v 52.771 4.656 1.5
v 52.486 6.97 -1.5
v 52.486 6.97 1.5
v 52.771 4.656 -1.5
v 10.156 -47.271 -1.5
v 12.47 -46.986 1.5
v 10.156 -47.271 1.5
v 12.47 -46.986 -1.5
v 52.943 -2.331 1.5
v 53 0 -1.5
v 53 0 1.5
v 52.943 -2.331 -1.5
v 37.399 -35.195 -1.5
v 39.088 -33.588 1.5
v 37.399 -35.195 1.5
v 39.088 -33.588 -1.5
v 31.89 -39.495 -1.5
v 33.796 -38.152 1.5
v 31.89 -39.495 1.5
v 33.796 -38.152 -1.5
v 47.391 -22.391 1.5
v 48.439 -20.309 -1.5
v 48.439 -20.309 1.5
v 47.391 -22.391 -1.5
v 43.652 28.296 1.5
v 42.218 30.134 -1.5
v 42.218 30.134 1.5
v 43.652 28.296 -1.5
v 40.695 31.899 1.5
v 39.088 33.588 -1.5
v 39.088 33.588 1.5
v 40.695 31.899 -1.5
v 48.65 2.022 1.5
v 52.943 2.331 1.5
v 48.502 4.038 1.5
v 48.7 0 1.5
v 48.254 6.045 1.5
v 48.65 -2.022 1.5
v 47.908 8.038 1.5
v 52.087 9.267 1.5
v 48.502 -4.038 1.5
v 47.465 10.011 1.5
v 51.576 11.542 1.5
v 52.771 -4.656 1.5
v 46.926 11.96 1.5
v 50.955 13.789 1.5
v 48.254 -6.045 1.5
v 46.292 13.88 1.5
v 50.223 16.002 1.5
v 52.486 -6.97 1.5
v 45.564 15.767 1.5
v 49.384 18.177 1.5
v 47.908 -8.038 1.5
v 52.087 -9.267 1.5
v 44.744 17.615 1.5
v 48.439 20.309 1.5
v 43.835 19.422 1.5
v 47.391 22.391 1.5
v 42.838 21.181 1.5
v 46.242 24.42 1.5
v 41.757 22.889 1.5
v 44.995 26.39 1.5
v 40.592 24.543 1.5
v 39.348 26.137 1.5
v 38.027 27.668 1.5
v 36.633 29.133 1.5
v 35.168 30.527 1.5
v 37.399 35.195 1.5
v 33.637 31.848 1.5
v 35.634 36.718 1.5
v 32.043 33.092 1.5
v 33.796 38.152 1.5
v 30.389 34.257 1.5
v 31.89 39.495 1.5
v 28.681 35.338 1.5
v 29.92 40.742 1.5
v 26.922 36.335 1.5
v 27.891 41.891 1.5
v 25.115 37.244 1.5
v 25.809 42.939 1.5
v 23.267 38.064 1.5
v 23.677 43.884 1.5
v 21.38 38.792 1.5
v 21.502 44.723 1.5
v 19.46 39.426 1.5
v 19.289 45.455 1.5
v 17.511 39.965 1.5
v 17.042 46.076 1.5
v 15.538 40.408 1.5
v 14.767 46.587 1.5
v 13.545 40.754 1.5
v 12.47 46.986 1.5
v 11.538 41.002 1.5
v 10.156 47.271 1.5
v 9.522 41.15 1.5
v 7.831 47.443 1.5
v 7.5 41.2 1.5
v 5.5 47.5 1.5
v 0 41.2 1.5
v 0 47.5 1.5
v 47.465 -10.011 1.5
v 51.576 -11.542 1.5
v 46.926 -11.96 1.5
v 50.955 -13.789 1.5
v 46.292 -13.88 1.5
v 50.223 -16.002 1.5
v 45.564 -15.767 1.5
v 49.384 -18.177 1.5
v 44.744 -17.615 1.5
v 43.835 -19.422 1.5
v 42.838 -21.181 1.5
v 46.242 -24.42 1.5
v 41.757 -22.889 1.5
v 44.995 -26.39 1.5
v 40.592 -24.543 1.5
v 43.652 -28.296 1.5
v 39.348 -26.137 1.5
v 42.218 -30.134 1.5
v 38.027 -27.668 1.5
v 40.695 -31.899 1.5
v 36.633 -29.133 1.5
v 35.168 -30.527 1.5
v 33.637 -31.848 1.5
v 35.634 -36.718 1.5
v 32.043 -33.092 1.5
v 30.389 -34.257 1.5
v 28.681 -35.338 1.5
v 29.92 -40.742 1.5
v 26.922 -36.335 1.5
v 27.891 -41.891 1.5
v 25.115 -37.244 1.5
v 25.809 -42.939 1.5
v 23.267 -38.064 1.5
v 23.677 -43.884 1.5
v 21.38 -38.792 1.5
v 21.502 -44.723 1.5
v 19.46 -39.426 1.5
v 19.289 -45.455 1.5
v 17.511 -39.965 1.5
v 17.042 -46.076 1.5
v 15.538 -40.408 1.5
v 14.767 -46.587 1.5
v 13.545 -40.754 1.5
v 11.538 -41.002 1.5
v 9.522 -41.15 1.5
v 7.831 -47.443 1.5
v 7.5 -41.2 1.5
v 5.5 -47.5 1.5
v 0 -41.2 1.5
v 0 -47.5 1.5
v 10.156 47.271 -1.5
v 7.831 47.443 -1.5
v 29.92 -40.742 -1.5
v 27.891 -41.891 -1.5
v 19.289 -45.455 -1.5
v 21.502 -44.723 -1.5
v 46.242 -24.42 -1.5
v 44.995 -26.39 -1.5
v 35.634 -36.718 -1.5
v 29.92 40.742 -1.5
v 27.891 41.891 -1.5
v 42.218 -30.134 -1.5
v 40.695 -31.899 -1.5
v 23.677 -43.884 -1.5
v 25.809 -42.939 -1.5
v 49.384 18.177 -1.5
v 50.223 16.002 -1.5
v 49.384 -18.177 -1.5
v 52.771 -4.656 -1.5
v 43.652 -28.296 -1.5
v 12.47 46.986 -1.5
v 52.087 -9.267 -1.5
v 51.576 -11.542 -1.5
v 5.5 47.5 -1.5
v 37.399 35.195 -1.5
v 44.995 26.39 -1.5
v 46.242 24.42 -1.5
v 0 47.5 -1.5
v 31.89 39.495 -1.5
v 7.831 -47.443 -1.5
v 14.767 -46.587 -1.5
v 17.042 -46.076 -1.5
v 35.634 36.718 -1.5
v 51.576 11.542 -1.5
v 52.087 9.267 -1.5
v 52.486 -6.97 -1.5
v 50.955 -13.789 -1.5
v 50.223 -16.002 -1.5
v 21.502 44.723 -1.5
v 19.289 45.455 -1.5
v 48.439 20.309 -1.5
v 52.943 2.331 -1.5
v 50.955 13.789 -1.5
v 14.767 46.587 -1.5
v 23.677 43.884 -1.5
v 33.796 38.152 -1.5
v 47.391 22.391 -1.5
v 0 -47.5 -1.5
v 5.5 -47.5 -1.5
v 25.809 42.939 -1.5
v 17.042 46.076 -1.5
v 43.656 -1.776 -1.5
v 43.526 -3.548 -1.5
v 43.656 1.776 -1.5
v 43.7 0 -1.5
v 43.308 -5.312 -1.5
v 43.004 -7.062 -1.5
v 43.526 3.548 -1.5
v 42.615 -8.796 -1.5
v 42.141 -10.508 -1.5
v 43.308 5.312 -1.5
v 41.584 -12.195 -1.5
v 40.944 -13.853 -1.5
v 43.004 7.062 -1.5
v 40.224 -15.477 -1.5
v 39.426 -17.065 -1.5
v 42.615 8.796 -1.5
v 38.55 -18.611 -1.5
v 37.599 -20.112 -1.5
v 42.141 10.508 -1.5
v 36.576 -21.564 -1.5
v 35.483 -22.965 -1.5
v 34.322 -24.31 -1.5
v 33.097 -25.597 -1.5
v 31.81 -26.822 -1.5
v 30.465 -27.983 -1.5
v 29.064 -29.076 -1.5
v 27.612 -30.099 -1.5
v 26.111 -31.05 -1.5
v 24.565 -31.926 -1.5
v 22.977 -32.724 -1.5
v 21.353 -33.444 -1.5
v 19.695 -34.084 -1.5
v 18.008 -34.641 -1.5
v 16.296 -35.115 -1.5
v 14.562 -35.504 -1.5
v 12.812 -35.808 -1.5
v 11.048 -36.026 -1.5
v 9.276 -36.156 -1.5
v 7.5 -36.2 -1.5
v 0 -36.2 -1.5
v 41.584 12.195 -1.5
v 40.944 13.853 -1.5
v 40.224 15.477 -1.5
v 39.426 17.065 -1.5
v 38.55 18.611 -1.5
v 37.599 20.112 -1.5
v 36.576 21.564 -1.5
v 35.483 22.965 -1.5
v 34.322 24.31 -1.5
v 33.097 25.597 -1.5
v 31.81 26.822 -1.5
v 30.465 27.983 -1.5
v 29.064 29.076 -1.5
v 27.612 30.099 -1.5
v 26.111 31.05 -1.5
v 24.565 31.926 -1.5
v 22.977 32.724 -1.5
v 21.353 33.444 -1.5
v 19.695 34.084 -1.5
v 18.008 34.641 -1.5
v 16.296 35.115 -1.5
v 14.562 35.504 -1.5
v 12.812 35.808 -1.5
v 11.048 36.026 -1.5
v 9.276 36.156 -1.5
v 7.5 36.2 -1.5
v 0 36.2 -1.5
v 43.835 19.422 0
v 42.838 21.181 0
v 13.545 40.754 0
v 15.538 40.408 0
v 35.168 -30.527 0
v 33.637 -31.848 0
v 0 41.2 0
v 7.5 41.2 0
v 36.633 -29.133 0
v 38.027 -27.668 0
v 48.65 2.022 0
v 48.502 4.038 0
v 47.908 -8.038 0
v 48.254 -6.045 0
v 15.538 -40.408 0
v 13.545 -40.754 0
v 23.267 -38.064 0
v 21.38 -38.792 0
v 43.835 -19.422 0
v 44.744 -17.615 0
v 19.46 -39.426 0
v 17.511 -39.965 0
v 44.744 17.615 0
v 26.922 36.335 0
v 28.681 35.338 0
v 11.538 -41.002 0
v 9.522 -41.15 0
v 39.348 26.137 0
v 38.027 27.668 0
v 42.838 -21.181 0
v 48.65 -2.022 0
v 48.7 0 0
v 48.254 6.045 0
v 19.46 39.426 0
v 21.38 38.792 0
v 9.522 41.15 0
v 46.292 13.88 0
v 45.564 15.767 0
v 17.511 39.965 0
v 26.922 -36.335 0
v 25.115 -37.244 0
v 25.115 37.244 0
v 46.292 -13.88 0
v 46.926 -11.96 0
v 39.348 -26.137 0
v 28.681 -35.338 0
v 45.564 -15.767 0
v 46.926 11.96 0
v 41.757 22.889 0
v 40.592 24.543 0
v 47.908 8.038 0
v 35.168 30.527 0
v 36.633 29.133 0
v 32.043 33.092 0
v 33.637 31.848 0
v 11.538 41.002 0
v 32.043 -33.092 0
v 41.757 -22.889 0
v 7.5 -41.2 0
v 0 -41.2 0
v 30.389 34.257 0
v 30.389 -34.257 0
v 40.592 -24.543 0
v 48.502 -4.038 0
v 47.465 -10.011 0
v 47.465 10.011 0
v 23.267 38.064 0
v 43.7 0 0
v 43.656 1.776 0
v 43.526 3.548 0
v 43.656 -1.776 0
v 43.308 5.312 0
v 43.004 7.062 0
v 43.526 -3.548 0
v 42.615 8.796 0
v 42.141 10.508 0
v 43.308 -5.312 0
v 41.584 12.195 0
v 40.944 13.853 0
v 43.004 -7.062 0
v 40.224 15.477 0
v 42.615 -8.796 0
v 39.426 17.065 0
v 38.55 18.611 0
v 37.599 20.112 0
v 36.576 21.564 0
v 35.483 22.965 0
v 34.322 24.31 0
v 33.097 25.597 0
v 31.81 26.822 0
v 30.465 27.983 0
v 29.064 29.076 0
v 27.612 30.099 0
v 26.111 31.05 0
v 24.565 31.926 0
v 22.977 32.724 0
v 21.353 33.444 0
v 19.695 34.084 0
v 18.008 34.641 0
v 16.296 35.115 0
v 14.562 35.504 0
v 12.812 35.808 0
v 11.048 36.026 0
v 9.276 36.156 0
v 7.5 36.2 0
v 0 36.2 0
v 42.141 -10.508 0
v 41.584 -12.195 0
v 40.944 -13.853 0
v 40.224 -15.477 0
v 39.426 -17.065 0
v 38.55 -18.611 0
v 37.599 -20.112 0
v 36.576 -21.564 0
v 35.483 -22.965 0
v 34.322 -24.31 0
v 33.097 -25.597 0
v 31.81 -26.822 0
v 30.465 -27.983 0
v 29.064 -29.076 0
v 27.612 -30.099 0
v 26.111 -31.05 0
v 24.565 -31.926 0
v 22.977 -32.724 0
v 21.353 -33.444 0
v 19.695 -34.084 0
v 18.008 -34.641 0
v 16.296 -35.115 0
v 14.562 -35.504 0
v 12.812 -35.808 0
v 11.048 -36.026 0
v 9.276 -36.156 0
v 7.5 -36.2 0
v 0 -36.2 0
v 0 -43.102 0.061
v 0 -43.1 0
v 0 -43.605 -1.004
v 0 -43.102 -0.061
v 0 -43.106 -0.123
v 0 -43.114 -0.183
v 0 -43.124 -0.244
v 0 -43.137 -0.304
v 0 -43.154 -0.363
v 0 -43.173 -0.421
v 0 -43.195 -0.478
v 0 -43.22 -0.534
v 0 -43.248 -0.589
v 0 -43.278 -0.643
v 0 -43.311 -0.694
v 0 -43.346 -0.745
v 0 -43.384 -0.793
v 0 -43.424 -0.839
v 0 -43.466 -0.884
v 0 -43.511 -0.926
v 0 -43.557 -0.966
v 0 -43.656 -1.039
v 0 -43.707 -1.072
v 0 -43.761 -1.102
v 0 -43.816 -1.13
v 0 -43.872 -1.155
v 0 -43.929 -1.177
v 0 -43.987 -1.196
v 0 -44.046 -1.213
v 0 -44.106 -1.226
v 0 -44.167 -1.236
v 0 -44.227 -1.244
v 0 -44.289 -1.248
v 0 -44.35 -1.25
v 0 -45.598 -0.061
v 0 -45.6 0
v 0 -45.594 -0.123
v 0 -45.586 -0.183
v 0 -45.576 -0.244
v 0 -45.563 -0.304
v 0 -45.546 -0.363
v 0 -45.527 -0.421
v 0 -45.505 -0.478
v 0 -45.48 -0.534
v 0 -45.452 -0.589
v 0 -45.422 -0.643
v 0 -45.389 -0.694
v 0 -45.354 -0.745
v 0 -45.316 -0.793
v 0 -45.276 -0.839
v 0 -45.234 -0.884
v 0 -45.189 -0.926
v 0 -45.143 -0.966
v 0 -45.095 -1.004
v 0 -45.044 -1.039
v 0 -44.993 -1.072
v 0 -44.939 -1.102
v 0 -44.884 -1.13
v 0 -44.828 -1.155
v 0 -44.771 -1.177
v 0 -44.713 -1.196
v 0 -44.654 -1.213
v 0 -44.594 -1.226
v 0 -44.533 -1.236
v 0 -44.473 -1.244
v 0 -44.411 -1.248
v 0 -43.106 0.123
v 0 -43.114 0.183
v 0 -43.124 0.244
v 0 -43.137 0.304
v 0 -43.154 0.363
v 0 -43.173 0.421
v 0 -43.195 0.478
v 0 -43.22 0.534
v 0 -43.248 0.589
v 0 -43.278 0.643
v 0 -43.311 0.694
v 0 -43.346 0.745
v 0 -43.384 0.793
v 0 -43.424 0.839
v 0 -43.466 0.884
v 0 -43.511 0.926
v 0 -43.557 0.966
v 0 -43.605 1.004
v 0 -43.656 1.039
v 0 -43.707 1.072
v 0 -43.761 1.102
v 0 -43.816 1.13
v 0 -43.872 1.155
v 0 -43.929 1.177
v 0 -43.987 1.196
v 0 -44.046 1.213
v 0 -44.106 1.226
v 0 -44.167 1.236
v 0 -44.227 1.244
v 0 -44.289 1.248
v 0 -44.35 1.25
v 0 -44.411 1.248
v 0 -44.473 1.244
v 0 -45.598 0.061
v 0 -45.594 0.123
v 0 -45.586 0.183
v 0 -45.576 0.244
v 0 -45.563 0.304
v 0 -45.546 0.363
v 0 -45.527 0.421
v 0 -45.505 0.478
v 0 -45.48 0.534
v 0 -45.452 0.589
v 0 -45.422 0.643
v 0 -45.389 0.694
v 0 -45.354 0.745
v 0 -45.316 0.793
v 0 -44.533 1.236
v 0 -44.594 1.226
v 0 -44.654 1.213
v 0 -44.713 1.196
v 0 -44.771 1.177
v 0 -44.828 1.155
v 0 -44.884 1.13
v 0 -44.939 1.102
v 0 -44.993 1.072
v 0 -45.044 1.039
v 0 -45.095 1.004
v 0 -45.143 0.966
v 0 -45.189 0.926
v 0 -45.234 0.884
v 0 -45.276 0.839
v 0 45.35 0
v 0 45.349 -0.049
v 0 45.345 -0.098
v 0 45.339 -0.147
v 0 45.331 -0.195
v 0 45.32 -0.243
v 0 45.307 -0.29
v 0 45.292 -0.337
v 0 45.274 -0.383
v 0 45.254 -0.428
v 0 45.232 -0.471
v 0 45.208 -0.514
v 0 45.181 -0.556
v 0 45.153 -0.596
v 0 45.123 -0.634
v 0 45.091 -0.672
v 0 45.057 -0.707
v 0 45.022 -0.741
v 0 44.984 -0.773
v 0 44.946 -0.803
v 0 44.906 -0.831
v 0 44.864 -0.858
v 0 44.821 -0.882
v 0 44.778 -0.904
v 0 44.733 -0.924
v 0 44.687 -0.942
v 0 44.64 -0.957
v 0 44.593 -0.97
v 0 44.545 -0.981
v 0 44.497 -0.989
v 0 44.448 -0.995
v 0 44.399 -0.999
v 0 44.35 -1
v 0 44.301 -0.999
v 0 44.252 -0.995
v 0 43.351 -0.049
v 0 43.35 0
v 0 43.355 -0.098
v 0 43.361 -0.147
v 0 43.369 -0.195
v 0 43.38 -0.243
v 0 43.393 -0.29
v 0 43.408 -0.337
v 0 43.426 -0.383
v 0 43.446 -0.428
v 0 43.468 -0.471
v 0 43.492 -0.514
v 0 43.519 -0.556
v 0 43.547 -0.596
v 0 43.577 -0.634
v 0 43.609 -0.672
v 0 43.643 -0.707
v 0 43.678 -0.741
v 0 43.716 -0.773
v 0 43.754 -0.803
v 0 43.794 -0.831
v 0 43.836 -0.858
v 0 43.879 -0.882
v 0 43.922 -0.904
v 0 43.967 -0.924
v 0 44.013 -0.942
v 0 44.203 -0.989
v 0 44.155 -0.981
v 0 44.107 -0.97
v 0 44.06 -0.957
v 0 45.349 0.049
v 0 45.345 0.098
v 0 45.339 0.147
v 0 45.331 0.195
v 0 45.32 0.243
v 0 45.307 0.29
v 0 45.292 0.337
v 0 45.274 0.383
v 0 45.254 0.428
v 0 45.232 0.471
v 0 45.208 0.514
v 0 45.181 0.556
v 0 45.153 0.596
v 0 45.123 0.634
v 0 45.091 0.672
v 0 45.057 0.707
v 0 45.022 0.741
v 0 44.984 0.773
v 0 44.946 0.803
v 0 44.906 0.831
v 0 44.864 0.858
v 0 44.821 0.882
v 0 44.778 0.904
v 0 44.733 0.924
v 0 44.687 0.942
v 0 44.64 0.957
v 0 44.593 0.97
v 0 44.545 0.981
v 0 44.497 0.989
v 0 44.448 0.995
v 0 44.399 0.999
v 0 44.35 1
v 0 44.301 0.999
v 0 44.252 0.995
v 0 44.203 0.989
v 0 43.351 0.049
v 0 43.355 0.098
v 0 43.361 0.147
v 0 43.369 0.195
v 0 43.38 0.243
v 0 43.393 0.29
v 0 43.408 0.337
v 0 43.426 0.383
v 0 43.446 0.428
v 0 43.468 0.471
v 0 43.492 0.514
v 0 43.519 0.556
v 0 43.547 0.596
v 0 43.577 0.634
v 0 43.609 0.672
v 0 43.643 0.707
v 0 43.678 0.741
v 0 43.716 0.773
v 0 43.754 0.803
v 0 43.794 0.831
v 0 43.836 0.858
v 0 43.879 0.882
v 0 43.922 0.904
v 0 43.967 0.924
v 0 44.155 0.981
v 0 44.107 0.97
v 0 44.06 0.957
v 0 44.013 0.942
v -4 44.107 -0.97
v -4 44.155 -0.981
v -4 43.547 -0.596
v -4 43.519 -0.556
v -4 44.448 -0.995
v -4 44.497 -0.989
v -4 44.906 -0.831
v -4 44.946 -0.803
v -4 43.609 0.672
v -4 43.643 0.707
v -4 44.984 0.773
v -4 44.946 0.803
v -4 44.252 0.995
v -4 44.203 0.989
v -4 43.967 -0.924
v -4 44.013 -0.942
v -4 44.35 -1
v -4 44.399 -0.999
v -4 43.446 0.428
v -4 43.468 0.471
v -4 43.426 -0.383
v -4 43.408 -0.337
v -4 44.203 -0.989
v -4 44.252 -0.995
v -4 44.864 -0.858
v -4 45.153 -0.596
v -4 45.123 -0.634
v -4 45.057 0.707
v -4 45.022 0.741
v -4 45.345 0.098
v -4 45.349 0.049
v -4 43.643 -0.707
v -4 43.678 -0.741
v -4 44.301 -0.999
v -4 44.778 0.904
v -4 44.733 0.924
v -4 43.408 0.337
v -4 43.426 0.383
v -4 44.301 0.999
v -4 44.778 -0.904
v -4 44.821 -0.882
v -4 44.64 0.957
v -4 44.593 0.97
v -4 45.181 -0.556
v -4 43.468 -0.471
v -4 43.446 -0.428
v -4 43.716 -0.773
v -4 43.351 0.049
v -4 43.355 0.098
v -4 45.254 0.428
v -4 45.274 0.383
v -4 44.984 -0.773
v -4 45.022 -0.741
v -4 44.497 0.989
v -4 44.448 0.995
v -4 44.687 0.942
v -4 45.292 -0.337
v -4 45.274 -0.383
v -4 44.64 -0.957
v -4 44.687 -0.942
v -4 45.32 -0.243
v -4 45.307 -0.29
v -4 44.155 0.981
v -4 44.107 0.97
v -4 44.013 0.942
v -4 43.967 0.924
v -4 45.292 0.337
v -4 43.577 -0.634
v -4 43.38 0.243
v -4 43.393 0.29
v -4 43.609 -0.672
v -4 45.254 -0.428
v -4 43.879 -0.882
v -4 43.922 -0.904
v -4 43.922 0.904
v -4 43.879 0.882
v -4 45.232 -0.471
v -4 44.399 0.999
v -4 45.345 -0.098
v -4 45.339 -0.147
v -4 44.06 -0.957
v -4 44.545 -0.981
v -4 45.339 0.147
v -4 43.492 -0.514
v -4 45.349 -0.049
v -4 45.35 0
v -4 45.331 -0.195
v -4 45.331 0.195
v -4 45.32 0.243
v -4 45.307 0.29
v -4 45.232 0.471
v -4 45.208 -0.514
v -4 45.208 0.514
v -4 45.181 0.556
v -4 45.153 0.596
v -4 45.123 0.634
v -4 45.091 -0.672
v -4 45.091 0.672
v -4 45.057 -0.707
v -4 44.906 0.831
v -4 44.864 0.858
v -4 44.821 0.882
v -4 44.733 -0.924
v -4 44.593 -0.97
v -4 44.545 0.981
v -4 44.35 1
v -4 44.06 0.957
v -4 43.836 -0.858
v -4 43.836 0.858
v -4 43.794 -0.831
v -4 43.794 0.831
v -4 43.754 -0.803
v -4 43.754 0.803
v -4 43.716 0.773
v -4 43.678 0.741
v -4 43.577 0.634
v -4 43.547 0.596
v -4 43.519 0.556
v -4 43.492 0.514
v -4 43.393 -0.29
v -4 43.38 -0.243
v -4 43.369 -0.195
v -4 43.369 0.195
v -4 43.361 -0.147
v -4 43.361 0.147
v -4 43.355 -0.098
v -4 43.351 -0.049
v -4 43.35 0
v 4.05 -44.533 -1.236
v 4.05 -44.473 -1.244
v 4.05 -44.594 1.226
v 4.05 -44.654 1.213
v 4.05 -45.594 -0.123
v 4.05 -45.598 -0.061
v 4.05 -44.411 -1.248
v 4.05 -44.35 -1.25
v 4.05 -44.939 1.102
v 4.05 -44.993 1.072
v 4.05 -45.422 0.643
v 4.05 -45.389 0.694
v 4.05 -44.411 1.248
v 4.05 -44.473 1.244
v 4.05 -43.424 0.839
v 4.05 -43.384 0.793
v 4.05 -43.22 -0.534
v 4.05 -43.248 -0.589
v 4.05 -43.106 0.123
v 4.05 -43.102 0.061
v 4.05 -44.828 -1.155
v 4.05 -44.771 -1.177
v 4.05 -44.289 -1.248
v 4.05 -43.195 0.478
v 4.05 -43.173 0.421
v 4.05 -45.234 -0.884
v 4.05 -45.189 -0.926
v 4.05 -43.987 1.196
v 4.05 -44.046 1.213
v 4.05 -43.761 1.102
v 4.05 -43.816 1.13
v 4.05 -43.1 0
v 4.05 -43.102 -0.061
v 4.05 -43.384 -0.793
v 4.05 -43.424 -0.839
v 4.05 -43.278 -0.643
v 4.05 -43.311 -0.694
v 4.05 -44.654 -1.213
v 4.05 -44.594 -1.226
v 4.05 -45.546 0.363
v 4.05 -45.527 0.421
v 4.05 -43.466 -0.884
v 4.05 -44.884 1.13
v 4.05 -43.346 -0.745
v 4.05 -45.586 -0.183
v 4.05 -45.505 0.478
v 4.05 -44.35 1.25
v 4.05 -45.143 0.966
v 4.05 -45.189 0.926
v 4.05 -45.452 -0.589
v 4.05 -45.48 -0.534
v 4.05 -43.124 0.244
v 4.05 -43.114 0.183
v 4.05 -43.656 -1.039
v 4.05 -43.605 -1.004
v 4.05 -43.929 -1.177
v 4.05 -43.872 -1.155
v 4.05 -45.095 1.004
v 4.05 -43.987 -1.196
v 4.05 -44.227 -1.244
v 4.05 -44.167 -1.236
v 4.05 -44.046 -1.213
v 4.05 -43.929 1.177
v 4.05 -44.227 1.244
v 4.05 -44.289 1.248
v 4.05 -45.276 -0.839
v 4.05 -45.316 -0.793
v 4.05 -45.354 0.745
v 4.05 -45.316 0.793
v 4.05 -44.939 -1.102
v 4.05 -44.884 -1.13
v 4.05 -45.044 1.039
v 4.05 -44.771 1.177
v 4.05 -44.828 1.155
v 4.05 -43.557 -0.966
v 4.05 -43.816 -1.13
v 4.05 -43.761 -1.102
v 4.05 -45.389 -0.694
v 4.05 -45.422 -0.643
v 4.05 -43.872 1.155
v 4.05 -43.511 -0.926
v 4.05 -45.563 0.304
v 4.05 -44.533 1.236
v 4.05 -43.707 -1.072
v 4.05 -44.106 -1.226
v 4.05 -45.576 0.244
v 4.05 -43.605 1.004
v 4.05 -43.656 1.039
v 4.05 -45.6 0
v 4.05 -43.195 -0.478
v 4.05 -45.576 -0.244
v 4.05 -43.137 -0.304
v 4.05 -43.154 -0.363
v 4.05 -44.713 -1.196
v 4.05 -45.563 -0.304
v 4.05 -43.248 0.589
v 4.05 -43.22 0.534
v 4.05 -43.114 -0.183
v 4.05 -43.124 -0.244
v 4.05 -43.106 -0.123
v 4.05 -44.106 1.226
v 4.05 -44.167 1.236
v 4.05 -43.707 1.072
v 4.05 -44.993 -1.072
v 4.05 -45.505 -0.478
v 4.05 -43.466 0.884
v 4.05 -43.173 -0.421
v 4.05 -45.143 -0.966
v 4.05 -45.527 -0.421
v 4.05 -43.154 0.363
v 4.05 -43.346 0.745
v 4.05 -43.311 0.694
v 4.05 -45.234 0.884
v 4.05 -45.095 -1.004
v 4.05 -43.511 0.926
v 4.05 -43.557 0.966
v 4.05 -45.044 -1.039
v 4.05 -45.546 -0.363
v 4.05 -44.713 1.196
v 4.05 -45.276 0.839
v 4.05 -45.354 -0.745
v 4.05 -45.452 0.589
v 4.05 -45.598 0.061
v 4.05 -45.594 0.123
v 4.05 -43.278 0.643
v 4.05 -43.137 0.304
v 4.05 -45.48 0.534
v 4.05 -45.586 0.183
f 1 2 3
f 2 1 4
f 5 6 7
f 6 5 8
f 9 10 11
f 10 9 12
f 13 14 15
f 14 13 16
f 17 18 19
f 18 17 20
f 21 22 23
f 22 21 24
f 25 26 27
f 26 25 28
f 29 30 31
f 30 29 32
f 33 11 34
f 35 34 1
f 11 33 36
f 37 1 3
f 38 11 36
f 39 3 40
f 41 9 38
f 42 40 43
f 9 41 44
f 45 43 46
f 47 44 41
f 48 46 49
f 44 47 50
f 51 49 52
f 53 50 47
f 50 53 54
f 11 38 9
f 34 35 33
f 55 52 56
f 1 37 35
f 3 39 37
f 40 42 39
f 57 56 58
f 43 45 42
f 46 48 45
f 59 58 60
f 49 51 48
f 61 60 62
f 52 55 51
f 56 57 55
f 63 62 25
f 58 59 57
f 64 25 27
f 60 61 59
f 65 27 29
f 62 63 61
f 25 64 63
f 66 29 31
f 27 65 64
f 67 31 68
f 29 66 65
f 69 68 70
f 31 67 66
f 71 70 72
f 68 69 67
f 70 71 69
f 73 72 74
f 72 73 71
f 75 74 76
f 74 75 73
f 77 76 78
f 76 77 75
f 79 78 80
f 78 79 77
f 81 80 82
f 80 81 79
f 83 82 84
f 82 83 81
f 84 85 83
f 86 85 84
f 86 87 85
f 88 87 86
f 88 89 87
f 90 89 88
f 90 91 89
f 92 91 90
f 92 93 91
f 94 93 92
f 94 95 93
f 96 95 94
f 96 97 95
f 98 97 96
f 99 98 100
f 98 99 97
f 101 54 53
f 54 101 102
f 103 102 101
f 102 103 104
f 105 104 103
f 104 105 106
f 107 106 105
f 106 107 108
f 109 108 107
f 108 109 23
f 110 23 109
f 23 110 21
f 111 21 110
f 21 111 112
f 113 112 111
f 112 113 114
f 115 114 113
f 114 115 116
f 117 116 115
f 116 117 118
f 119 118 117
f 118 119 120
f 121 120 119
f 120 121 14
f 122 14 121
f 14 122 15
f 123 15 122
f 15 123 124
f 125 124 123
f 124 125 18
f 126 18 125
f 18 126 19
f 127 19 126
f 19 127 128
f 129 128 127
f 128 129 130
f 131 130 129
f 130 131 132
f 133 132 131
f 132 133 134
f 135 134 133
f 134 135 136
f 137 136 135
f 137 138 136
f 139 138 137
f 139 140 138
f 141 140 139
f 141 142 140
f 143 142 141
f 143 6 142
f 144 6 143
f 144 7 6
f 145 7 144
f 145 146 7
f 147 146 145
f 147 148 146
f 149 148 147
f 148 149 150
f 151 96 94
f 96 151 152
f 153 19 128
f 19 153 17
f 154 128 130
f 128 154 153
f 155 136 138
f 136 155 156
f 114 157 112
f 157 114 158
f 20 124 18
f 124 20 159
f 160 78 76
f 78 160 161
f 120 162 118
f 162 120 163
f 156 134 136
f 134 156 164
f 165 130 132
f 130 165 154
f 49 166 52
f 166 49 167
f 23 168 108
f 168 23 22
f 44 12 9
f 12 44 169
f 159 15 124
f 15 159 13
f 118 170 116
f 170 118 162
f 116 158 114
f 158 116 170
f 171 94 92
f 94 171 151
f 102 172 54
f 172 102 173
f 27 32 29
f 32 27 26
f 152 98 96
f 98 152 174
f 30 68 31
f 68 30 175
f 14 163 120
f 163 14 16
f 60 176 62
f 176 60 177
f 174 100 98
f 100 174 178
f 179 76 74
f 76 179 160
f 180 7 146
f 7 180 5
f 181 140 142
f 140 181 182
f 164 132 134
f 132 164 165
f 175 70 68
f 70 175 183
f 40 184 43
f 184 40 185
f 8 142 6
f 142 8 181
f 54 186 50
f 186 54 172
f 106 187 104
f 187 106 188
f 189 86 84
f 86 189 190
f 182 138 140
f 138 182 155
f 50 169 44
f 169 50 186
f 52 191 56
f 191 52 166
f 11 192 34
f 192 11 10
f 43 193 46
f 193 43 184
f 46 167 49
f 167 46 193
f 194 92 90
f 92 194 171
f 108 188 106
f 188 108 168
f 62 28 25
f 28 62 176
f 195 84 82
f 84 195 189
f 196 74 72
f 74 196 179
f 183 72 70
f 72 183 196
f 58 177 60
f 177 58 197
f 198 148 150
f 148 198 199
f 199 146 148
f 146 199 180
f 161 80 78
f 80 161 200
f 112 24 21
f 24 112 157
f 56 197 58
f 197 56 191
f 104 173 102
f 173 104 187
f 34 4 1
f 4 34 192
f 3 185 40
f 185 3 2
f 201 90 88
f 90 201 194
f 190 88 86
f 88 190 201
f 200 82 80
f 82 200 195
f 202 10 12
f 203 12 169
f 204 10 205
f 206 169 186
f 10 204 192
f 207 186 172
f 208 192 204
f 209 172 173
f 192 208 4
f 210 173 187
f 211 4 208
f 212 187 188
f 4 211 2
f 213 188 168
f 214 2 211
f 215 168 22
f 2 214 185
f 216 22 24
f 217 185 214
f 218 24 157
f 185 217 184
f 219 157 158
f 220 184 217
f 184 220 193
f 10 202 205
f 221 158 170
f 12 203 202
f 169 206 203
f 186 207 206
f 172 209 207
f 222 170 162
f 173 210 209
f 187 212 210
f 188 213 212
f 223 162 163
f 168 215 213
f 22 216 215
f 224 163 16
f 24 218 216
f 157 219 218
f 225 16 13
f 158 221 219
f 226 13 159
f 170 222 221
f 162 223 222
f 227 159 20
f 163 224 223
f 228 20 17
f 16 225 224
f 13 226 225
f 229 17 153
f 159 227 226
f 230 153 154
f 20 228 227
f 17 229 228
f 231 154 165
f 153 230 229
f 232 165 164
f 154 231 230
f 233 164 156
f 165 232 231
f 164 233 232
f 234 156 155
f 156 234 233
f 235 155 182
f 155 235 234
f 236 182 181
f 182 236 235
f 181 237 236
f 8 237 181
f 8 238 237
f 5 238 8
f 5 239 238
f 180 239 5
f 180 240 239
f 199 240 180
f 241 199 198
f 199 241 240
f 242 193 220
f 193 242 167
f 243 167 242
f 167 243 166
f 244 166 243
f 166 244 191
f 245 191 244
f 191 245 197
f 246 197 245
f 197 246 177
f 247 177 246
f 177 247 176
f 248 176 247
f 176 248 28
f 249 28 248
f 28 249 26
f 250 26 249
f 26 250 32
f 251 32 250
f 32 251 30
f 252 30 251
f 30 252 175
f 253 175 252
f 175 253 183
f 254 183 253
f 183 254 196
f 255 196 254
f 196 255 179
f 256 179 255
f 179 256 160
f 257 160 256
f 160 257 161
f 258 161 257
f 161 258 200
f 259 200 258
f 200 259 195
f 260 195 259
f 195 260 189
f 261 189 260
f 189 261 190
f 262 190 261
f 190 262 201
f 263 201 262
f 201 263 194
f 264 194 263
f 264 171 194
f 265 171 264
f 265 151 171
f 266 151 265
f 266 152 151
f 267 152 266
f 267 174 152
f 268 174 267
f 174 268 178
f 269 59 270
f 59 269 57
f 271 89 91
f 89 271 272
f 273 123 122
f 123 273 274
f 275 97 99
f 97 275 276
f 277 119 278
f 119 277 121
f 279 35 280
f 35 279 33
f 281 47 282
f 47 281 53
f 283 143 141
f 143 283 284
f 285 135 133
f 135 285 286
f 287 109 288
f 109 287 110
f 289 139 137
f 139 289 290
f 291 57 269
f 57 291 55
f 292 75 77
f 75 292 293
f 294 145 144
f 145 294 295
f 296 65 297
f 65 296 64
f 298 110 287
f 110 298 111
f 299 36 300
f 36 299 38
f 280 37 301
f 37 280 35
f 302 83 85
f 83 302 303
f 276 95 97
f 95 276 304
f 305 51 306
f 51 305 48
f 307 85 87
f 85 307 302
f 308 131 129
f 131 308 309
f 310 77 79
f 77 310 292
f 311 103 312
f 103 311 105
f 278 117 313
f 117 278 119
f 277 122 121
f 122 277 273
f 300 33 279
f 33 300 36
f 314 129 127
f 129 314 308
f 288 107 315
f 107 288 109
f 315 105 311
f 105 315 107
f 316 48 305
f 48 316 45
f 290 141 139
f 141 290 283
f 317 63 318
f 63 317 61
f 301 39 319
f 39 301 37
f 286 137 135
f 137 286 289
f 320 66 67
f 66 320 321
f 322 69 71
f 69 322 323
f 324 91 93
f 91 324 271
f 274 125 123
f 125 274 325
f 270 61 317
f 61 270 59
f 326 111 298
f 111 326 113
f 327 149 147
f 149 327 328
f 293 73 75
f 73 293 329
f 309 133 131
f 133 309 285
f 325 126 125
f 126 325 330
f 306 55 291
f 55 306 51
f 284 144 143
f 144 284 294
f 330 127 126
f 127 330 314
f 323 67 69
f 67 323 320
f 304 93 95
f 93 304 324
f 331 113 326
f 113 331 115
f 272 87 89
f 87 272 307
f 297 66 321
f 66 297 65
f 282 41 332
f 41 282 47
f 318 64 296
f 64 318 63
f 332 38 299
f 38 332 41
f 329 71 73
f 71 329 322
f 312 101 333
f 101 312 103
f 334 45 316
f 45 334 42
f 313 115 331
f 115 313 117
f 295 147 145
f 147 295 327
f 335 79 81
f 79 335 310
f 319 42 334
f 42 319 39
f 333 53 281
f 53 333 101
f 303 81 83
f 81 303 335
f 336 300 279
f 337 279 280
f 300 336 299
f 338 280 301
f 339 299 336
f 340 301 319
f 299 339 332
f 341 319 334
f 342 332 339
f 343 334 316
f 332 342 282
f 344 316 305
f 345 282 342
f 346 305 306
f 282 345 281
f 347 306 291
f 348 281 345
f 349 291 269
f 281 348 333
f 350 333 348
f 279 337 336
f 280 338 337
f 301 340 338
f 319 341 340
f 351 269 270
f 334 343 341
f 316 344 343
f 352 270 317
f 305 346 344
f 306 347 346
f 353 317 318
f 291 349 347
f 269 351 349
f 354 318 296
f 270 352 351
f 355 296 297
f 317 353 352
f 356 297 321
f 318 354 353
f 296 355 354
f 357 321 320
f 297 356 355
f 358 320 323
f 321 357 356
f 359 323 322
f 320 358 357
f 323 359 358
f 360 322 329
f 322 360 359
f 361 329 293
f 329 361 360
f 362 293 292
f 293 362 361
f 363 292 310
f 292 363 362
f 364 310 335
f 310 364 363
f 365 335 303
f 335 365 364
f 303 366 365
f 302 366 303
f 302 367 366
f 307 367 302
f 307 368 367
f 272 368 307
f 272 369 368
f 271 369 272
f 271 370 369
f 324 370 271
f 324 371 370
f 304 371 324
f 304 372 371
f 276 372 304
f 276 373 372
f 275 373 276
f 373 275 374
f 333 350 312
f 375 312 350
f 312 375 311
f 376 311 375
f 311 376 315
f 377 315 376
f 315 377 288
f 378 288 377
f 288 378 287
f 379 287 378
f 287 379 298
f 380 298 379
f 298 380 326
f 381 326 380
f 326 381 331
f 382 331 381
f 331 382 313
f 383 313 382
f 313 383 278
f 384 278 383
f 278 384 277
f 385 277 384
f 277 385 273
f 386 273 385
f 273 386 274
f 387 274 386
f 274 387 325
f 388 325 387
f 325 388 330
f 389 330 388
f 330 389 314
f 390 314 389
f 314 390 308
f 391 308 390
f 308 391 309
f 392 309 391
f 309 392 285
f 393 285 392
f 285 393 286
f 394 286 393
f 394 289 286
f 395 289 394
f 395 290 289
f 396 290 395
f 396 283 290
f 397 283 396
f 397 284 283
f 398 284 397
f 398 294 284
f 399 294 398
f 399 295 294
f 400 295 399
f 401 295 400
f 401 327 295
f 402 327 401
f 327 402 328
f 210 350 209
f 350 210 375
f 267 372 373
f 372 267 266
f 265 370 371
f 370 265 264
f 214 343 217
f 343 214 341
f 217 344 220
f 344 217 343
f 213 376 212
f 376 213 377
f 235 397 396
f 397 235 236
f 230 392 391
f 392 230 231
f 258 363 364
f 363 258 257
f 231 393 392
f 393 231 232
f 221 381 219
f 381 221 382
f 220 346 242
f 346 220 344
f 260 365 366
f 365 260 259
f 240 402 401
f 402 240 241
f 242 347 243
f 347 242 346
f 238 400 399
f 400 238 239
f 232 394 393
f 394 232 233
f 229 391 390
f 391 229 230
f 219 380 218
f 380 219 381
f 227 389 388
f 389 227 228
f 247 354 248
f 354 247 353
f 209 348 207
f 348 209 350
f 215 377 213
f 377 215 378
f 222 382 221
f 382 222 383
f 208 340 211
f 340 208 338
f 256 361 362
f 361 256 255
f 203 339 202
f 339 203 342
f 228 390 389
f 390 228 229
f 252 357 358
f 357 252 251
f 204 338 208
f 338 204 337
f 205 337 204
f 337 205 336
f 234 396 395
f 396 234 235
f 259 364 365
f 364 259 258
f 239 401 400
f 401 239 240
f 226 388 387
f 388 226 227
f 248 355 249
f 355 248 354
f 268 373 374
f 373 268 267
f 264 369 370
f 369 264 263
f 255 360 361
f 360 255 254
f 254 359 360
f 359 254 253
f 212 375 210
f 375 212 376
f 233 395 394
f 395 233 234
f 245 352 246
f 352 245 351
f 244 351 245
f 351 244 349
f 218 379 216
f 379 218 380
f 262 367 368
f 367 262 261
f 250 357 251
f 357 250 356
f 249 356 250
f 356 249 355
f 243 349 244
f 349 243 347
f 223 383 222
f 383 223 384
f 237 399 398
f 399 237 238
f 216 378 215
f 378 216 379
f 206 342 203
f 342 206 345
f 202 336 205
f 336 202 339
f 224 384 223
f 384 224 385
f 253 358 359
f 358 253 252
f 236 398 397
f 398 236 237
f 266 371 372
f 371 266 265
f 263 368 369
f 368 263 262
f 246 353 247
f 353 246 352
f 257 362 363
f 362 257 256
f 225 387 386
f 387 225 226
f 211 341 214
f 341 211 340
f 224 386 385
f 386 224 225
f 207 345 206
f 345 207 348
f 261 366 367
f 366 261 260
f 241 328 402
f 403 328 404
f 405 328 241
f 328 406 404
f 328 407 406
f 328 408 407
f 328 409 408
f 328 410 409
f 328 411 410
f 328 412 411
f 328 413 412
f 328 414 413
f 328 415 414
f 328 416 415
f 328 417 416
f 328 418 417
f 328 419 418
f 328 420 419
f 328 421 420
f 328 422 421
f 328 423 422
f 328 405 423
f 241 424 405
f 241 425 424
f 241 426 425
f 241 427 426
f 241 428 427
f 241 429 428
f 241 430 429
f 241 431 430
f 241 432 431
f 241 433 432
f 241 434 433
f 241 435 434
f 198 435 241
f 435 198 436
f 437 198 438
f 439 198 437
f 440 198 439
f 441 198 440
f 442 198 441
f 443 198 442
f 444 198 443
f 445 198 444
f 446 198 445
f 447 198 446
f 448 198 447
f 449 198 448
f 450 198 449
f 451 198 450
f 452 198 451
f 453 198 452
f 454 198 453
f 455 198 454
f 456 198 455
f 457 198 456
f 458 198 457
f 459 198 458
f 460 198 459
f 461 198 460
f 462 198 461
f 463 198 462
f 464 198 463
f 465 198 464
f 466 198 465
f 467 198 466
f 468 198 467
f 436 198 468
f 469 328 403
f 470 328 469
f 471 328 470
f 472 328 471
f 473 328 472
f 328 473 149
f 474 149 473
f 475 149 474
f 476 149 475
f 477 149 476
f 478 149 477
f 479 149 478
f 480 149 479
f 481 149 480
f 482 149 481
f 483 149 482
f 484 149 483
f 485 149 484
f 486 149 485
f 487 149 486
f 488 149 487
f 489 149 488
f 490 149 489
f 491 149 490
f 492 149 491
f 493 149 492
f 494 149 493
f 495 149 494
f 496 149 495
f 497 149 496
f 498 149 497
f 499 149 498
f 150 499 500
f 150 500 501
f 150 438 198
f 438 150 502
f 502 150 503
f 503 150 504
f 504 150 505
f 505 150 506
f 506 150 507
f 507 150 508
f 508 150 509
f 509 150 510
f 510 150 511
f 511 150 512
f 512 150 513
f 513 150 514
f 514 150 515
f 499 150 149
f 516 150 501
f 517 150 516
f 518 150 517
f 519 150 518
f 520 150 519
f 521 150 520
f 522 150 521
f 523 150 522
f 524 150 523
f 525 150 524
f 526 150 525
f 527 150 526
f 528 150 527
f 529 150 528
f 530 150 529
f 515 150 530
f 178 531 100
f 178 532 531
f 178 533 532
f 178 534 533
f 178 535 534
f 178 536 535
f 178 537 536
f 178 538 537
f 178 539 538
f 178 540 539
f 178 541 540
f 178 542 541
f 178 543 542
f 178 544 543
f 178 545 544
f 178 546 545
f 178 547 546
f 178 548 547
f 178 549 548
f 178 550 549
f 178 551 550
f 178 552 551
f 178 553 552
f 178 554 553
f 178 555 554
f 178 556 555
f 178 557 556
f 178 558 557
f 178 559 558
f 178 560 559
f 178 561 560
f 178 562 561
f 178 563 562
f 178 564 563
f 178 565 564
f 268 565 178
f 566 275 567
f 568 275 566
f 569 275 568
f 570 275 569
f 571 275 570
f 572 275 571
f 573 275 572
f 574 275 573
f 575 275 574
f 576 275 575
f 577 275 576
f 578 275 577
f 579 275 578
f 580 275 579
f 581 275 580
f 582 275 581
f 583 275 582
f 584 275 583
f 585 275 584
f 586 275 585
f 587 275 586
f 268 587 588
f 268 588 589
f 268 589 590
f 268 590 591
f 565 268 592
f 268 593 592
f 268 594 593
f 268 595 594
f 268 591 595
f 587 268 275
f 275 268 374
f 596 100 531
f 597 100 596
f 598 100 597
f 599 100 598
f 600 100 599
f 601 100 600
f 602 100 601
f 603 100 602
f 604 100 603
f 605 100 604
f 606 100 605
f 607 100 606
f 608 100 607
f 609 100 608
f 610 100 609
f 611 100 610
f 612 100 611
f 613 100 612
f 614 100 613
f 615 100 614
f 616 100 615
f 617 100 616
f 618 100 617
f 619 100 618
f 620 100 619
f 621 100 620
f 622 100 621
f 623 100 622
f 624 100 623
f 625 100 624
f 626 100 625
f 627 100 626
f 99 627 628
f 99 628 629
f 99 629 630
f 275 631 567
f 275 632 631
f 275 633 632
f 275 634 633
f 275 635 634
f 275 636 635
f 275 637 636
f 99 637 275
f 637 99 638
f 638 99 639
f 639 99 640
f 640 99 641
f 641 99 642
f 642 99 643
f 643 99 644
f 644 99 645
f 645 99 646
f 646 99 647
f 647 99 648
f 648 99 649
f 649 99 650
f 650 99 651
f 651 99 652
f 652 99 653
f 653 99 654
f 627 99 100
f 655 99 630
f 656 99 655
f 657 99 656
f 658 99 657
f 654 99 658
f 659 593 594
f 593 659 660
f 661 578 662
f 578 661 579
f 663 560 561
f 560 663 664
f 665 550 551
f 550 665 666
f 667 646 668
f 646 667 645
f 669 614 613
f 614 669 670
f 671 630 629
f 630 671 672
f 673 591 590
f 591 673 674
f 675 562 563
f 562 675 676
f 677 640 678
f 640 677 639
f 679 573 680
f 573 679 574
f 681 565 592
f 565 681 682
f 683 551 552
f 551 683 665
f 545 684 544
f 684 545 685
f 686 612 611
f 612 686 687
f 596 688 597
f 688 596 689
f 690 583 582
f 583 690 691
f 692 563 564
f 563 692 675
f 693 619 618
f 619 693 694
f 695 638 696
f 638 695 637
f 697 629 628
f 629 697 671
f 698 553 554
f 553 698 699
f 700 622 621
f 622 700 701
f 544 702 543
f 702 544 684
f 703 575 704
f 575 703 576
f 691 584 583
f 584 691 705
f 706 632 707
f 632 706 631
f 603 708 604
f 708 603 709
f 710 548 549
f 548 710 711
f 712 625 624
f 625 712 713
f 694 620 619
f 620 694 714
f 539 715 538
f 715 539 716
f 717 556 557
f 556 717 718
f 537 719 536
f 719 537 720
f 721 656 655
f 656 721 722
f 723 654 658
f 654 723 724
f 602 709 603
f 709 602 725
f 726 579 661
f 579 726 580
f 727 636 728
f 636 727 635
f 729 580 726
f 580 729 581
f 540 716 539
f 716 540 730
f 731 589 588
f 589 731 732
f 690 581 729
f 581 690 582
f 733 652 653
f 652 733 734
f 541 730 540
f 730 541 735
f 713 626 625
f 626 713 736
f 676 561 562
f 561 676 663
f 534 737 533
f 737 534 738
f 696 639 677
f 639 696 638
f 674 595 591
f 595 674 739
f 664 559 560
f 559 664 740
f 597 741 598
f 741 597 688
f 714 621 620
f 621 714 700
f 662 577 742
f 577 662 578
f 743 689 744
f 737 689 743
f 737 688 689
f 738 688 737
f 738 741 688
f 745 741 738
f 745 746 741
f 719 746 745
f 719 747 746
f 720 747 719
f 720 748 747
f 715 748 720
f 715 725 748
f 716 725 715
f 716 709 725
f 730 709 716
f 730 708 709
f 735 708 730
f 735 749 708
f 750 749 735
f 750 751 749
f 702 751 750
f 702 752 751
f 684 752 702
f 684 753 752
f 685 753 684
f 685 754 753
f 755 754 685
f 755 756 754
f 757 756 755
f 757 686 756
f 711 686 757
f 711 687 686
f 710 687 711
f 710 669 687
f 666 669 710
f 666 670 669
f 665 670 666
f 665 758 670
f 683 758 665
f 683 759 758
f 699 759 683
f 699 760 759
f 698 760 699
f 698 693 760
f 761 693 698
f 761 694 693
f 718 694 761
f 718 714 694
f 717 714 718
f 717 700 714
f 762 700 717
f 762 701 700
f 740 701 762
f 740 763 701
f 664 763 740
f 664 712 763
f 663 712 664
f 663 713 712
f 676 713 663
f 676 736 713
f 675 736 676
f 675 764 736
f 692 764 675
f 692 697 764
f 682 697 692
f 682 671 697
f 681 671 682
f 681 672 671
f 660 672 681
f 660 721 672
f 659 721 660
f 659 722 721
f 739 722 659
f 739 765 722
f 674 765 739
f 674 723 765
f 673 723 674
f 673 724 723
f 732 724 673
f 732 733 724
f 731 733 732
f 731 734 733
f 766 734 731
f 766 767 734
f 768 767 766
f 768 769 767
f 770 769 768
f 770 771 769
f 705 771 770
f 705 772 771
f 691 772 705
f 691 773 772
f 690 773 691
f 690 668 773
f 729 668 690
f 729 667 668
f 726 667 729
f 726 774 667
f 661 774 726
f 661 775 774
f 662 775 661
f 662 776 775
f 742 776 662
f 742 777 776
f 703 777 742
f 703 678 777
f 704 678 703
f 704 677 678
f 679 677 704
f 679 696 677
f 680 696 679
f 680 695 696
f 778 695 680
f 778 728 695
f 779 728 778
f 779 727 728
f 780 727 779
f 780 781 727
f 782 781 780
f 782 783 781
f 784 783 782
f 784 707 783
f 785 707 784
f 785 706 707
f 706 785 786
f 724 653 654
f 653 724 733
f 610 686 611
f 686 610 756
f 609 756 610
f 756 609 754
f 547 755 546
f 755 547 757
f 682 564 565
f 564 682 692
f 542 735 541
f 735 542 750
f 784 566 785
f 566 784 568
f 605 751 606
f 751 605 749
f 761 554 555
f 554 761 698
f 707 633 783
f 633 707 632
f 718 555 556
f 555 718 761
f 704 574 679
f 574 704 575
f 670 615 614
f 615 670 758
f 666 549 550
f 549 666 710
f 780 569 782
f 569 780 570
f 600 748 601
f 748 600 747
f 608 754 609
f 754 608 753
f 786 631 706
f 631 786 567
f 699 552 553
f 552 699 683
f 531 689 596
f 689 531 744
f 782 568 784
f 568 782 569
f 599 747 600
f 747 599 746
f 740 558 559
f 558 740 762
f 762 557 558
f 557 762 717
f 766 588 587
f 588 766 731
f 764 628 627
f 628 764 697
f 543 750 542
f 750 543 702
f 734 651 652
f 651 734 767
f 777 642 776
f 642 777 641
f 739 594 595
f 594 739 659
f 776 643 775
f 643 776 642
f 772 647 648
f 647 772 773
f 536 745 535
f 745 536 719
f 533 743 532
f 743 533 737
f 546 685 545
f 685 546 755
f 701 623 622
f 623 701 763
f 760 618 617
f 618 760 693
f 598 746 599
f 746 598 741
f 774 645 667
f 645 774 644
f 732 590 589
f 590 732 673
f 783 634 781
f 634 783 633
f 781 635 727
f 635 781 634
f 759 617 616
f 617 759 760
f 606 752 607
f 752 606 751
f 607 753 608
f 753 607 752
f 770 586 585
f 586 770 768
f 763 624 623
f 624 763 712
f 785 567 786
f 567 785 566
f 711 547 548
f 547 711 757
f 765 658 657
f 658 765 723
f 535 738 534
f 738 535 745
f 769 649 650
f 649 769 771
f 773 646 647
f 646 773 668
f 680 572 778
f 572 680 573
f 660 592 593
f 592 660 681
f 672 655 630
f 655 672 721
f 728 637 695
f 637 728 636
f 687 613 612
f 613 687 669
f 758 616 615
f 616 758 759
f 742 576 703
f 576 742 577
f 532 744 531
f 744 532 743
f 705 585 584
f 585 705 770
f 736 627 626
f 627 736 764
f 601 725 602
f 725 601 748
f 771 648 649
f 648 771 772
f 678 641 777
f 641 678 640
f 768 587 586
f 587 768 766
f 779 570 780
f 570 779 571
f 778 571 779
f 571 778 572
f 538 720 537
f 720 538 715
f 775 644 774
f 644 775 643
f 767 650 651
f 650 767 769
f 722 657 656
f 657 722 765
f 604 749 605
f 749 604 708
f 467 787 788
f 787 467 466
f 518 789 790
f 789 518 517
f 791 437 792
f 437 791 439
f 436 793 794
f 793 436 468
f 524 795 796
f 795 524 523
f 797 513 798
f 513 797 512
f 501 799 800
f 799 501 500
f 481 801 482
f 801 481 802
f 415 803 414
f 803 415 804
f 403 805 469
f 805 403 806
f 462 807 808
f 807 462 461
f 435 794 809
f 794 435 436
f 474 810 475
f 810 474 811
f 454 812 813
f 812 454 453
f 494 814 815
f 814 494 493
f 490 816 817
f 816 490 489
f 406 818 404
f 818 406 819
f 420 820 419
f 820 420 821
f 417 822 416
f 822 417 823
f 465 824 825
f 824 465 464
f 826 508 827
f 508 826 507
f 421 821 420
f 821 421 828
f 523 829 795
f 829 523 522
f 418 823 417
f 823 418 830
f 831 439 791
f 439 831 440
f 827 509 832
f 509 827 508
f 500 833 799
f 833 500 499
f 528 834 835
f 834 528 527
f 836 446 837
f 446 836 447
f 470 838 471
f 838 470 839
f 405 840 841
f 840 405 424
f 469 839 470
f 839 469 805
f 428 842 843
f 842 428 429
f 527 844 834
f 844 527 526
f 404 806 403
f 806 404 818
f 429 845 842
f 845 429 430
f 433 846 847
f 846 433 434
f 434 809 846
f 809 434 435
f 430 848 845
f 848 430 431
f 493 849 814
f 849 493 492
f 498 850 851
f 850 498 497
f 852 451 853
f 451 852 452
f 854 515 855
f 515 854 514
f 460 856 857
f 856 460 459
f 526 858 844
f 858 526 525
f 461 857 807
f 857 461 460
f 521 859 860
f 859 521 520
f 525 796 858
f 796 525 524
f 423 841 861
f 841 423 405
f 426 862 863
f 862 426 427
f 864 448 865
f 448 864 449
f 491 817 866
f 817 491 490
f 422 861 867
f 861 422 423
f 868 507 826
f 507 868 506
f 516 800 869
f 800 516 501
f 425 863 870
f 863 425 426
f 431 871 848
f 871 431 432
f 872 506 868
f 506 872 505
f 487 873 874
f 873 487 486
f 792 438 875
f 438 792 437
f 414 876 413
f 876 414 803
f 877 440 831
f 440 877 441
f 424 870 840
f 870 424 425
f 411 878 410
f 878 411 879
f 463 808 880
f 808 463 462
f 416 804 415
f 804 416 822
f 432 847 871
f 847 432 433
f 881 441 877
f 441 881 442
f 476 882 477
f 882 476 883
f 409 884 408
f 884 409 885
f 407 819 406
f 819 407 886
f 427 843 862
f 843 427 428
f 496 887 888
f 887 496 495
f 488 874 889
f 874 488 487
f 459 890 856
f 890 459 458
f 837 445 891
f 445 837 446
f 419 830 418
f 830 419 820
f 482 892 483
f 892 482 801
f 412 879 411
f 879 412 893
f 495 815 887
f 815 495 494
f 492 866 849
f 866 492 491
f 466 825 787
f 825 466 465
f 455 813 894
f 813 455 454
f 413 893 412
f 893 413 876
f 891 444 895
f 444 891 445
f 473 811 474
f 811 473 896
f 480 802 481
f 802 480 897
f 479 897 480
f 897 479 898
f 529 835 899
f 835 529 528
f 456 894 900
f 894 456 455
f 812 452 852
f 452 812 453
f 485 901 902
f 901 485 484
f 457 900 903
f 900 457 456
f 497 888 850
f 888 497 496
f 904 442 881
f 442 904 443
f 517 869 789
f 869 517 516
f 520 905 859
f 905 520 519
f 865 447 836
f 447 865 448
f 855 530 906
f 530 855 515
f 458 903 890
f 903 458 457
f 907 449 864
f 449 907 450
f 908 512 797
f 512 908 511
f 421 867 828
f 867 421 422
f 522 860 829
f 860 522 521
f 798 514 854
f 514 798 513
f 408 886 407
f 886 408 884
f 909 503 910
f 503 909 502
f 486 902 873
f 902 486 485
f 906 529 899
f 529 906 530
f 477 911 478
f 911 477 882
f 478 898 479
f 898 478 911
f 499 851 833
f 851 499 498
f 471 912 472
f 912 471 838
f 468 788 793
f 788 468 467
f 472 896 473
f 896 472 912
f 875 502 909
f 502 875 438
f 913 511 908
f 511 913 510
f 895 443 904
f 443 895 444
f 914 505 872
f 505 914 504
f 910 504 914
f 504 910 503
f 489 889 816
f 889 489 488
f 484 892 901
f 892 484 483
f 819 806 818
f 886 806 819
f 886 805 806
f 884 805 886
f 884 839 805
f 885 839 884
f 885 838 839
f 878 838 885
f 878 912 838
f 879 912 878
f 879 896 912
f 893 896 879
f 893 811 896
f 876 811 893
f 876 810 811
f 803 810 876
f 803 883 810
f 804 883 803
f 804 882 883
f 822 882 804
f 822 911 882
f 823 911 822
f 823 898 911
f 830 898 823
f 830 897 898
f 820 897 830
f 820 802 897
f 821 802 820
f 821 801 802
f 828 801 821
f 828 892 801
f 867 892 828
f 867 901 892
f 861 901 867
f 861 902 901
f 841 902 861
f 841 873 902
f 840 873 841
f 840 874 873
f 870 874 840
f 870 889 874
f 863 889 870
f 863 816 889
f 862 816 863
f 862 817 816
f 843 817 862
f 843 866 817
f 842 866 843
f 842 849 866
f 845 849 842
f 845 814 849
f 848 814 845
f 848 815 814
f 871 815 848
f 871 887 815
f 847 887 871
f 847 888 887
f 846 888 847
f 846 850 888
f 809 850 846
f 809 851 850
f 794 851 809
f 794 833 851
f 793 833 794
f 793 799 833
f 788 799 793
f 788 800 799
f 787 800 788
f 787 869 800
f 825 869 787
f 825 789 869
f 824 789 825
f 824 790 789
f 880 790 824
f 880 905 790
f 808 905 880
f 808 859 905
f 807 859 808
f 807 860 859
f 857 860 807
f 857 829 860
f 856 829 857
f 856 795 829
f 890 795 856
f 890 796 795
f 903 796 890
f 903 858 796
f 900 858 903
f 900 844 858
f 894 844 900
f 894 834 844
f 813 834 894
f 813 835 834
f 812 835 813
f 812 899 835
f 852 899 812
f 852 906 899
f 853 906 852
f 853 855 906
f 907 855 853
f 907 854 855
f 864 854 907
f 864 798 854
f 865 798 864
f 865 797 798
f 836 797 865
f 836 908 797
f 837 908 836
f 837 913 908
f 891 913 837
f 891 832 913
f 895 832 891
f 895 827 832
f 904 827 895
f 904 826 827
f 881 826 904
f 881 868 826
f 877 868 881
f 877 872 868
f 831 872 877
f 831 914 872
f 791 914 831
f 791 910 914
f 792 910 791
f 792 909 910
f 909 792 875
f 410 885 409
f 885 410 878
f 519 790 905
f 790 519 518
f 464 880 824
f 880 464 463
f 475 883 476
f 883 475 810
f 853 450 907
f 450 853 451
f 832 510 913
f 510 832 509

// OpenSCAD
// ═══════════════════════════════════════════════════════════════════════════════
// Steelseries Arctis Pro → replacement earpad adapter  (two-part, rigid print)
// ═══════════════════════════════════════════════════════════════════════════════
//
// Print TWO copies of this half. Assembly:
//   1. Bring one half in from each side of the Arctis Pro mount.
//   2. Align the inner ridge with the mount's retention groove.
//   3. Press the mating faces together — the pegs lock the halves flush.
//   4. Stretch the replacement earpad over the outer groove; its rubber
//      tension clamps the whole assembly to the mount.
//
// The inner ridge sits in the Arctis Pro's 2 mm × 7 mm retention groove and
// prevents the adapter from shifting axially on the mount.
//
// The Arctis mount is a STADIUM shape: two semicircular ends (Ø 82 mm)
// connected by 15 mm straight sides (97 − 82 = 15 mm).
//
// Print flat face down — no supports needed.
// Recommended: 0.2 mm layers, ≥ 3 perimeters (minimum wall ≈ 1.3 mm).
//
// Tuning:
//   inner fit loose   → decrease fit_clearance (try 0.2)
//   inner fit tight   → increase fit_clearance (try 0.6)
//   ridge won't seat  → decrease ridge_d by 0.5 mm and reprint
//   grommet slips out → increase groove_d (keep min wall ≥ 1 mm)

// ── Arctis Pro mount (measured) ───────────────────────────────────────────────
mount_major  = 97;       // outer, top-bottom total  [mm]
mount_minor  = 82;       // outer, left-right  total [mm]  (= diameter of end circles)
// straight section = mount_major - mount_minor = 15 mm

// ── Replacement earpad inner opening (measured) ───────────────────────────────
pad_major = 106;         // top-bottom  [mm]
pad_minor = 95;          // left-right   [mm]
// assumes same stadium style; straight section = 106 − 95 = 11 mm

// ── Adapter settings ──────────────────────────────────────────────────────────
fit_clearance = 0.4;     // total diametric clearance on inner bore
adapter_h     = 3;       // adapter height [mm]

groove_w = 0;            // outer grommet groove width [mm]  (0 = disabled)
groove_d = 3;            // outer grommet groove depth [mm]

ridge_w  = 1.5;          // inner ridge axial width  [mm]  — Arctis groove: 2 mm high
ridge_d  = 5.0;          // inner ridge radial depth [mm]  — Arctis groove: ~7 mm deep

peg_r         = 1.0;     // alignment peg radius [mm]
peg_len       = 4;       // alignment peg length [mm]
peg_clearance = 0.25;    // peg-to-hole radial clearance [mm]

// ── Derived ───────────────────────────────────────────────────────────────────
bore_major = mount_major + fit_clearance;
bore_minor = mount_minor + fit_clearance;
// Peg Y sits at the centre of the wall on the mating face (X = 0)
peg_y = (bore_minor + pad_minor) / 4;

$fn = 128;

// Stadium: two circles of diameter `minor` whose centres are separated by
// (major − minor) along X, connected by straight sides via hull().
module stadium(major, minor, h) {
    straight = major - minor;
    hull() {
        translate([ straight / 2, 0, 0]) cylinder(d = minor, h = h, center = true);
        translate([-straight / 2, 0, 0]) cylinder(d = minor, h = h, center = true);
    }
}

// Full ring (both halves combined — not printed directly)
module adapter_full() {
    union() {
        // Outer shell with inner bore
        difference() {
            stadium(pad_major, pad_minor, adapter_h);
            stadium(bore_major, bore_minor, adapter_h + 1);
            // Outer grommet groove (disabled; uncomment and set groove_w > 0 to restore)
            //difference() {
            //    stadium(pad_major + 0.01, pad_minor + 0.01, groove_w);
            //    stadium(pad_major - 2*groove_d, pad_minor - 2*groove_d, groove_w + 0.01);
            //}
        }
        // Inner ridge — protrudes into bore, seats in Arctis 2 mm × 7 mm groove
        // Ridge sits flush at the bottom face (headset side)
        difference() {
            translate([0, 0, -(adapter_h - ridge_w) / 2])
                stadium(bore_major + 0.02, bore_minor + 0.02, ridge_w);
            translate([0, 0, -(adapter_h - ridge_w) / 2])
                stadium(bore_major - 2 * ridge_d, bore_minor - 2 * ridge_d, ridge_w + 0.1);
        }
    }
}

// One half (print two copies; second copy rotates 180° around Z on the build plate)
// Mating face is the flat cut at X = 0.
// Peg at +Y protrudes in −X; hole at −Y recesses in +X.
// After 180° Z rotation the second half's hole aligns with the first's peg and vice versa.
module adapter_half() {
    difference() {
        union() {
            // Positive-X half of the ring
            intersection() {
                adapter_full();
                translate([(pad_major + 1) / 2, 0, 0])
                    cube([pad_major + 1, (pad_minor + 2) * 2, adapter_h + 2], center = true);
            }
            // Alignment peg at +Y: protrudes in −X direction from mating face
            translate([-(peg_len / 2), peg_y, 0])
                rotate([0, 90, 0]) cylinder(r = peg_r, h = peg_len, center = true);
        }
        // Alignment hole at −Y: recessed in +X direction into body
        translate([(peg_len / 2), -peg_y, 0])
            rotate([0, 90, 0]) cylinder(r = peg_r + peg_clearance, h = peg_len + 0.1, center = true);
    }
}

adapter_half();
